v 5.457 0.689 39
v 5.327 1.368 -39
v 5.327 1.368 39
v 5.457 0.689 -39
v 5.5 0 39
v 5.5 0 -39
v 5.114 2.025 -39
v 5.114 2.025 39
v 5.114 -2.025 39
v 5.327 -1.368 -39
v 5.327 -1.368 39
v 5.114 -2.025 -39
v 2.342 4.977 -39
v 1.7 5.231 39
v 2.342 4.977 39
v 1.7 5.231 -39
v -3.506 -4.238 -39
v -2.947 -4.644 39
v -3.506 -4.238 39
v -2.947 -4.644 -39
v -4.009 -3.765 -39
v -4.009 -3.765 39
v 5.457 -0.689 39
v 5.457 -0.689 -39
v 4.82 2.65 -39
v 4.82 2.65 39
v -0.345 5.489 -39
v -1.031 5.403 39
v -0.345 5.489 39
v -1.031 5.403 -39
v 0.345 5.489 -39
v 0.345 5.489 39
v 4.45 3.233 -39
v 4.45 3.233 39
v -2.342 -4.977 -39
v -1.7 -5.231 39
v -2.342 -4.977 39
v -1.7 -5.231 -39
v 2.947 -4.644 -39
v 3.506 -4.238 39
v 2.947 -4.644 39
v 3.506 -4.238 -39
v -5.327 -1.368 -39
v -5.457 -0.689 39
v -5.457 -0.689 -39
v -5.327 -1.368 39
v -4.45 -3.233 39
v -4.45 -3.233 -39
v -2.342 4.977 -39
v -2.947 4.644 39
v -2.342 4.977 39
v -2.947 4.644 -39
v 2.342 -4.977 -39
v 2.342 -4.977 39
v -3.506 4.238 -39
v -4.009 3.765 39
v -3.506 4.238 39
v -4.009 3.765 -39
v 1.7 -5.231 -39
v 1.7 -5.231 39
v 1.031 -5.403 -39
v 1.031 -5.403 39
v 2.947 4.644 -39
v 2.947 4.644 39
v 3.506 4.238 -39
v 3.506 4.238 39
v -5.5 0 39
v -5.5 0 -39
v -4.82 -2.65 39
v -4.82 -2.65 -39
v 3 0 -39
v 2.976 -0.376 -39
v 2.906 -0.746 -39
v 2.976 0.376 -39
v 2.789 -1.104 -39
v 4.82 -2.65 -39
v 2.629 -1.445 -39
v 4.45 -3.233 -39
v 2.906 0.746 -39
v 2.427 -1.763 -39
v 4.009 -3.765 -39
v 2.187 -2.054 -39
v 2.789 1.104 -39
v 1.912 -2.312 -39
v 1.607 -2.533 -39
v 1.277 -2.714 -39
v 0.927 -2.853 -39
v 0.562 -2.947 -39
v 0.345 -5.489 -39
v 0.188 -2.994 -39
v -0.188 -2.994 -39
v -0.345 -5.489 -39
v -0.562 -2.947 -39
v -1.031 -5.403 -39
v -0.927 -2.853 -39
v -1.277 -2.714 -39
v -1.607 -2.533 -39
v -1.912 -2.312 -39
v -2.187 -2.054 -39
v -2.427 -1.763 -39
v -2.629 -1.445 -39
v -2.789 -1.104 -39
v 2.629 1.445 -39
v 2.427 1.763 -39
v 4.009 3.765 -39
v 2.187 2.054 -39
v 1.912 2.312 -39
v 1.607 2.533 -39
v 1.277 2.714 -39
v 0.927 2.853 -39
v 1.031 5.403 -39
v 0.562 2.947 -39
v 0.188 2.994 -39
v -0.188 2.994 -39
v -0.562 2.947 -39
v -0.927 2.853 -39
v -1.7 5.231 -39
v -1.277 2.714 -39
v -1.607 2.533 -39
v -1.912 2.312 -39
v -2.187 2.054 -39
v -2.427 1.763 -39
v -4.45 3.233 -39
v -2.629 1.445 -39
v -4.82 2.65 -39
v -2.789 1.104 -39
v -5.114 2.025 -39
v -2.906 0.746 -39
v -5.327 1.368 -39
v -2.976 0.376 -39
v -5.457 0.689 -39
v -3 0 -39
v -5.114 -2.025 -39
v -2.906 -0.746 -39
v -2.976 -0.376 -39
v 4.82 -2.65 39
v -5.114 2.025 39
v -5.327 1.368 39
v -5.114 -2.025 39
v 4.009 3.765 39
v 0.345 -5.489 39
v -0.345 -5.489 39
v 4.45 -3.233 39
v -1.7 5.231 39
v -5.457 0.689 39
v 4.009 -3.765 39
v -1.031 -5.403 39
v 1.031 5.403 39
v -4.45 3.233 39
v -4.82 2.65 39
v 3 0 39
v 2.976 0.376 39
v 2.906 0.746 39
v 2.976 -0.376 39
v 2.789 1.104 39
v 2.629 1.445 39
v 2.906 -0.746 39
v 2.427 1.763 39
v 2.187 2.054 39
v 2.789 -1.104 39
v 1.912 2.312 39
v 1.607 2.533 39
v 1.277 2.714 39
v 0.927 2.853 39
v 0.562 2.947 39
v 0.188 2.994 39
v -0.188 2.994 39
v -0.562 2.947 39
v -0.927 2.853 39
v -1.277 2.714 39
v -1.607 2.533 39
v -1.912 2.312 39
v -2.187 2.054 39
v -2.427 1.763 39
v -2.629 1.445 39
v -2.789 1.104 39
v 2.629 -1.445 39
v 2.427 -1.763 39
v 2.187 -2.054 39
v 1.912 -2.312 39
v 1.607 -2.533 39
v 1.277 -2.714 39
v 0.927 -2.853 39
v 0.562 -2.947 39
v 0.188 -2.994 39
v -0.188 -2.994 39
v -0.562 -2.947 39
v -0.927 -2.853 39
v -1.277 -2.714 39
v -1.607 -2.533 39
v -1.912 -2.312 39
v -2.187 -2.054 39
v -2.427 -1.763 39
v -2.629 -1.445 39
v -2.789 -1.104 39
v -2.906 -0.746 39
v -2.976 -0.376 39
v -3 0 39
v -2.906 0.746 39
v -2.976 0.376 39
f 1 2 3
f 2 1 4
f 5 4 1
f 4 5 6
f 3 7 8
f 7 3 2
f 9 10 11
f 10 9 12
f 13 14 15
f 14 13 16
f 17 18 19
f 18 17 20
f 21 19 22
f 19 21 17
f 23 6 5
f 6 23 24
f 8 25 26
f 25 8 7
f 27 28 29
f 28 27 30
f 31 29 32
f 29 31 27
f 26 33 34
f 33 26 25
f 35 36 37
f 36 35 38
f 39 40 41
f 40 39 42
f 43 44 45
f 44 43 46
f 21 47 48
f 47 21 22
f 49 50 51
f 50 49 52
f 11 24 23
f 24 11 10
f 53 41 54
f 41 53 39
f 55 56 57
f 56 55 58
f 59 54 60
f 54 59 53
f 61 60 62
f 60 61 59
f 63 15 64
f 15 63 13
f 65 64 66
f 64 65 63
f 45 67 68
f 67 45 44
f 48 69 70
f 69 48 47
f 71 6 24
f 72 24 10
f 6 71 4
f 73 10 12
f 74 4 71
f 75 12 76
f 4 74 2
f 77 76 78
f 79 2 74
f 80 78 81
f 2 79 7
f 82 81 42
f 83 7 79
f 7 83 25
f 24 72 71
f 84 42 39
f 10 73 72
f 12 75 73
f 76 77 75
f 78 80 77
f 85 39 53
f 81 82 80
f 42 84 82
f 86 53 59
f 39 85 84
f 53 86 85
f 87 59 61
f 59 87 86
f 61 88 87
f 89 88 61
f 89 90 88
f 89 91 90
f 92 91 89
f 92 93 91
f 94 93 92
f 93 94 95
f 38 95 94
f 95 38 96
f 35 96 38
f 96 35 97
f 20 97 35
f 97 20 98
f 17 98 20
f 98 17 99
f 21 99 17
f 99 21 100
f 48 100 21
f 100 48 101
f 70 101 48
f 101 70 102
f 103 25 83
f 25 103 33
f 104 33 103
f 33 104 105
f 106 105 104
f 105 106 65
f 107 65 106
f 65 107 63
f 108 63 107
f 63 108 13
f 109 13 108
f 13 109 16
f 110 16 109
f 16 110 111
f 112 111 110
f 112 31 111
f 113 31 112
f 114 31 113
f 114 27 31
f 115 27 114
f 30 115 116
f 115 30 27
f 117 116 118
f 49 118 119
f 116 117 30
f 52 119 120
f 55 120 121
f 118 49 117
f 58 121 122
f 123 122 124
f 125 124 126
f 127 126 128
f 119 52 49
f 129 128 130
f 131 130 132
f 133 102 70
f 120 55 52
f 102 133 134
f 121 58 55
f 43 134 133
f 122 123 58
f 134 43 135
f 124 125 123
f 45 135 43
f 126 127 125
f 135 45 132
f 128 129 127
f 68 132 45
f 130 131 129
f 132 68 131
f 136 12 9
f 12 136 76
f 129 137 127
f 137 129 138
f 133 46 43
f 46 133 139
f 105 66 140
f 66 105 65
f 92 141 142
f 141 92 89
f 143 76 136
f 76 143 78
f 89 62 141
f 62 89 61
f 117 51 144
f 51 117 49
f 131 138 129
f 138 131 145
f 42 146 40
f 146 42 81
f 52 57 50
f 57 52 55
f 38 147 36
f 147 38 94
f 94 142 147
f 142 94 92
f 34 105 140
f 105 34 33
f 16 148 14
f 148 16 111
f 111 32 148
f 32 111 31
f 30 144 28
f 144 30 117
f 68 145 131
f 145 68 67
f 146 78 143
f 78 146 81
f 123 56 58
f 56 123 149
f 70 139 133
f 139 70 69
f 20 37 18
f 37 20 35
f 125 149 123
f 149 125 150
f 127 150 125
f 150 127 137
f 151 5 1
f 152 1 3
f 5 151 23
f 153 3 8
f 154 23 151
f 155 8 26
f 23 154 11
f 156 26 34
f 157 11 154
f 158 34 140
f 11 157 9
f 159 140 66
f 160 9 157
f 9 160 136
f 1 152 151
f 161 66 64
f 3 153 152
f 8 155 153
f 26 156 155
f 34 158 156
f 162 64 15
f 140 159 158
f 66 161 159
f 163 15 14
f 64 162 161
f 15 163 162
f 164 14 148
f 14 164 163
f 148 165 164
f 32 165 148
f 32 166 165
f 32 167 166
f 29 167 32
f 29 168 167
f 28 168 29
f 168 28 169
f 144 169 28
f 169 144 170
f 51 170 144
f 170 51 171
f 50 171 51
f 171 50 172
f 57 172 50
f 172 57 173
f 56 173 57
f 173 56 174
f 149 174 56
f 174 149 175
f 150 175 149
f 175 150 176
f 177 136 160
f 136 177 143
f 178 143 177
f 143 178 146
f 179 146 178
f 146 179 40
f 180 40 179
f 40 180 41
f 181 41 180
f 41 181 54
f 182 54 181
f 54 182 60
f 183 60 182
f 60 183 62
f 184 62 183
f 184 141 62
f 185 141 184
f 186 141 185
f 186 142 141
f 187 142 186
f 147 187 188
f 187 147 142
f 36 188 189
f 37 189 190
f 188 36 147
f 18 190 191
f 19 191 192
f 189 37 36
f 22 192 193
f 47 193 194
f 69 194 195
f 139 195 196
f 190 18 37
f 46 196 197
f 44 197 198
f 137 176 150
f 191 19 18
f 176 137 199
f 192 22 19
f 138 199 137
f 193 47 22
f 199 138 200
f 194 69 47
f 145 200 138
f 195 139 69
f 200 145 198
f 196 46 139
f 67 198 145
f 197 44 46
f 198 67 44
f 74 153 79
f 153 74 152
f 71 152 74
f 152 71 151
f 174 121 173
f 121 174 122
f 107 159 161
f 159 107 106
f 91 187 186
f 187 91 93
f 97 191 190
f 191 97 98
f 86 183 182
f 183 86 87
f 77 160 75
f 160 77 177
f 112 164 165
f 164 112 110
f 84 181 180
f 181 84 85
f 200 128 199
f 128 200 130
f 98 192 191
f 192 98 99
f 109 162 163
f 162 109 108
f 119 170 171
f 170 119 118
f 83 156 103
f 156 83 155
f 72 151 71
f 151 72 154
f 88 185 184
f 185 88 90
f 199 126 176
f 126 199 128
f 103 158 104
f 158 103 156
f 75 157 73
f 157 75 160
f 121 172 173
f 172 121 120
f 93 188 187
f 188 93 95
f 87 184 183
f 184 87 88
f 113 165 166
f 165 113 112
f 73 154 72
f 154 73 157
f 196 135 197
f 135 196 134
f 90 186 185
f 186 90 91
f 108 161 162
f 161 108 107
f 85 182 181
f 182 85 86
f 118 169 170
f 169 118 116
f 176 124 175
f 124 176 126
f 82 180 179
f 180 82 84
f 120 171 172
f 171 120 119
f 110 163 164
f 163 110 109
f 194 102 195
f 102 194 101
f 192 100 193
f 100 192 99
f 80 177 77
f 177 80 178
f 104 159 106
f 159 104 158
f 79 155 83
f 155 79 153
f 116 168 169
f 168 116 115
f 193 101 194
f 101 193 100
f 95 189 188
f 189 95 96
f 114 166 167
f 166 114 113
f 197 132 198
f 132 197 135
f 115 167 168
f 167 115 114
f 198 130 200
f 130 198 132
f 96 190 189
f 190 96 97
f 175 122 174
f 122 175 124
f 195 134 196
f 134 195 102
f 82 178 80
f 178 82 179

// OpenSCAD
$fn = 50;


difference() {
	union() {
		translate(v = [0, 0, -39.0000000000]) {
			cylinder(h = 78, r = 5.5000000000);
		}
	}
	union() {
		translate(v = [0, 0, -100.0000000000]) {
			cylinder(h = 200, r = 3.0000000000);
		}
	}
}
